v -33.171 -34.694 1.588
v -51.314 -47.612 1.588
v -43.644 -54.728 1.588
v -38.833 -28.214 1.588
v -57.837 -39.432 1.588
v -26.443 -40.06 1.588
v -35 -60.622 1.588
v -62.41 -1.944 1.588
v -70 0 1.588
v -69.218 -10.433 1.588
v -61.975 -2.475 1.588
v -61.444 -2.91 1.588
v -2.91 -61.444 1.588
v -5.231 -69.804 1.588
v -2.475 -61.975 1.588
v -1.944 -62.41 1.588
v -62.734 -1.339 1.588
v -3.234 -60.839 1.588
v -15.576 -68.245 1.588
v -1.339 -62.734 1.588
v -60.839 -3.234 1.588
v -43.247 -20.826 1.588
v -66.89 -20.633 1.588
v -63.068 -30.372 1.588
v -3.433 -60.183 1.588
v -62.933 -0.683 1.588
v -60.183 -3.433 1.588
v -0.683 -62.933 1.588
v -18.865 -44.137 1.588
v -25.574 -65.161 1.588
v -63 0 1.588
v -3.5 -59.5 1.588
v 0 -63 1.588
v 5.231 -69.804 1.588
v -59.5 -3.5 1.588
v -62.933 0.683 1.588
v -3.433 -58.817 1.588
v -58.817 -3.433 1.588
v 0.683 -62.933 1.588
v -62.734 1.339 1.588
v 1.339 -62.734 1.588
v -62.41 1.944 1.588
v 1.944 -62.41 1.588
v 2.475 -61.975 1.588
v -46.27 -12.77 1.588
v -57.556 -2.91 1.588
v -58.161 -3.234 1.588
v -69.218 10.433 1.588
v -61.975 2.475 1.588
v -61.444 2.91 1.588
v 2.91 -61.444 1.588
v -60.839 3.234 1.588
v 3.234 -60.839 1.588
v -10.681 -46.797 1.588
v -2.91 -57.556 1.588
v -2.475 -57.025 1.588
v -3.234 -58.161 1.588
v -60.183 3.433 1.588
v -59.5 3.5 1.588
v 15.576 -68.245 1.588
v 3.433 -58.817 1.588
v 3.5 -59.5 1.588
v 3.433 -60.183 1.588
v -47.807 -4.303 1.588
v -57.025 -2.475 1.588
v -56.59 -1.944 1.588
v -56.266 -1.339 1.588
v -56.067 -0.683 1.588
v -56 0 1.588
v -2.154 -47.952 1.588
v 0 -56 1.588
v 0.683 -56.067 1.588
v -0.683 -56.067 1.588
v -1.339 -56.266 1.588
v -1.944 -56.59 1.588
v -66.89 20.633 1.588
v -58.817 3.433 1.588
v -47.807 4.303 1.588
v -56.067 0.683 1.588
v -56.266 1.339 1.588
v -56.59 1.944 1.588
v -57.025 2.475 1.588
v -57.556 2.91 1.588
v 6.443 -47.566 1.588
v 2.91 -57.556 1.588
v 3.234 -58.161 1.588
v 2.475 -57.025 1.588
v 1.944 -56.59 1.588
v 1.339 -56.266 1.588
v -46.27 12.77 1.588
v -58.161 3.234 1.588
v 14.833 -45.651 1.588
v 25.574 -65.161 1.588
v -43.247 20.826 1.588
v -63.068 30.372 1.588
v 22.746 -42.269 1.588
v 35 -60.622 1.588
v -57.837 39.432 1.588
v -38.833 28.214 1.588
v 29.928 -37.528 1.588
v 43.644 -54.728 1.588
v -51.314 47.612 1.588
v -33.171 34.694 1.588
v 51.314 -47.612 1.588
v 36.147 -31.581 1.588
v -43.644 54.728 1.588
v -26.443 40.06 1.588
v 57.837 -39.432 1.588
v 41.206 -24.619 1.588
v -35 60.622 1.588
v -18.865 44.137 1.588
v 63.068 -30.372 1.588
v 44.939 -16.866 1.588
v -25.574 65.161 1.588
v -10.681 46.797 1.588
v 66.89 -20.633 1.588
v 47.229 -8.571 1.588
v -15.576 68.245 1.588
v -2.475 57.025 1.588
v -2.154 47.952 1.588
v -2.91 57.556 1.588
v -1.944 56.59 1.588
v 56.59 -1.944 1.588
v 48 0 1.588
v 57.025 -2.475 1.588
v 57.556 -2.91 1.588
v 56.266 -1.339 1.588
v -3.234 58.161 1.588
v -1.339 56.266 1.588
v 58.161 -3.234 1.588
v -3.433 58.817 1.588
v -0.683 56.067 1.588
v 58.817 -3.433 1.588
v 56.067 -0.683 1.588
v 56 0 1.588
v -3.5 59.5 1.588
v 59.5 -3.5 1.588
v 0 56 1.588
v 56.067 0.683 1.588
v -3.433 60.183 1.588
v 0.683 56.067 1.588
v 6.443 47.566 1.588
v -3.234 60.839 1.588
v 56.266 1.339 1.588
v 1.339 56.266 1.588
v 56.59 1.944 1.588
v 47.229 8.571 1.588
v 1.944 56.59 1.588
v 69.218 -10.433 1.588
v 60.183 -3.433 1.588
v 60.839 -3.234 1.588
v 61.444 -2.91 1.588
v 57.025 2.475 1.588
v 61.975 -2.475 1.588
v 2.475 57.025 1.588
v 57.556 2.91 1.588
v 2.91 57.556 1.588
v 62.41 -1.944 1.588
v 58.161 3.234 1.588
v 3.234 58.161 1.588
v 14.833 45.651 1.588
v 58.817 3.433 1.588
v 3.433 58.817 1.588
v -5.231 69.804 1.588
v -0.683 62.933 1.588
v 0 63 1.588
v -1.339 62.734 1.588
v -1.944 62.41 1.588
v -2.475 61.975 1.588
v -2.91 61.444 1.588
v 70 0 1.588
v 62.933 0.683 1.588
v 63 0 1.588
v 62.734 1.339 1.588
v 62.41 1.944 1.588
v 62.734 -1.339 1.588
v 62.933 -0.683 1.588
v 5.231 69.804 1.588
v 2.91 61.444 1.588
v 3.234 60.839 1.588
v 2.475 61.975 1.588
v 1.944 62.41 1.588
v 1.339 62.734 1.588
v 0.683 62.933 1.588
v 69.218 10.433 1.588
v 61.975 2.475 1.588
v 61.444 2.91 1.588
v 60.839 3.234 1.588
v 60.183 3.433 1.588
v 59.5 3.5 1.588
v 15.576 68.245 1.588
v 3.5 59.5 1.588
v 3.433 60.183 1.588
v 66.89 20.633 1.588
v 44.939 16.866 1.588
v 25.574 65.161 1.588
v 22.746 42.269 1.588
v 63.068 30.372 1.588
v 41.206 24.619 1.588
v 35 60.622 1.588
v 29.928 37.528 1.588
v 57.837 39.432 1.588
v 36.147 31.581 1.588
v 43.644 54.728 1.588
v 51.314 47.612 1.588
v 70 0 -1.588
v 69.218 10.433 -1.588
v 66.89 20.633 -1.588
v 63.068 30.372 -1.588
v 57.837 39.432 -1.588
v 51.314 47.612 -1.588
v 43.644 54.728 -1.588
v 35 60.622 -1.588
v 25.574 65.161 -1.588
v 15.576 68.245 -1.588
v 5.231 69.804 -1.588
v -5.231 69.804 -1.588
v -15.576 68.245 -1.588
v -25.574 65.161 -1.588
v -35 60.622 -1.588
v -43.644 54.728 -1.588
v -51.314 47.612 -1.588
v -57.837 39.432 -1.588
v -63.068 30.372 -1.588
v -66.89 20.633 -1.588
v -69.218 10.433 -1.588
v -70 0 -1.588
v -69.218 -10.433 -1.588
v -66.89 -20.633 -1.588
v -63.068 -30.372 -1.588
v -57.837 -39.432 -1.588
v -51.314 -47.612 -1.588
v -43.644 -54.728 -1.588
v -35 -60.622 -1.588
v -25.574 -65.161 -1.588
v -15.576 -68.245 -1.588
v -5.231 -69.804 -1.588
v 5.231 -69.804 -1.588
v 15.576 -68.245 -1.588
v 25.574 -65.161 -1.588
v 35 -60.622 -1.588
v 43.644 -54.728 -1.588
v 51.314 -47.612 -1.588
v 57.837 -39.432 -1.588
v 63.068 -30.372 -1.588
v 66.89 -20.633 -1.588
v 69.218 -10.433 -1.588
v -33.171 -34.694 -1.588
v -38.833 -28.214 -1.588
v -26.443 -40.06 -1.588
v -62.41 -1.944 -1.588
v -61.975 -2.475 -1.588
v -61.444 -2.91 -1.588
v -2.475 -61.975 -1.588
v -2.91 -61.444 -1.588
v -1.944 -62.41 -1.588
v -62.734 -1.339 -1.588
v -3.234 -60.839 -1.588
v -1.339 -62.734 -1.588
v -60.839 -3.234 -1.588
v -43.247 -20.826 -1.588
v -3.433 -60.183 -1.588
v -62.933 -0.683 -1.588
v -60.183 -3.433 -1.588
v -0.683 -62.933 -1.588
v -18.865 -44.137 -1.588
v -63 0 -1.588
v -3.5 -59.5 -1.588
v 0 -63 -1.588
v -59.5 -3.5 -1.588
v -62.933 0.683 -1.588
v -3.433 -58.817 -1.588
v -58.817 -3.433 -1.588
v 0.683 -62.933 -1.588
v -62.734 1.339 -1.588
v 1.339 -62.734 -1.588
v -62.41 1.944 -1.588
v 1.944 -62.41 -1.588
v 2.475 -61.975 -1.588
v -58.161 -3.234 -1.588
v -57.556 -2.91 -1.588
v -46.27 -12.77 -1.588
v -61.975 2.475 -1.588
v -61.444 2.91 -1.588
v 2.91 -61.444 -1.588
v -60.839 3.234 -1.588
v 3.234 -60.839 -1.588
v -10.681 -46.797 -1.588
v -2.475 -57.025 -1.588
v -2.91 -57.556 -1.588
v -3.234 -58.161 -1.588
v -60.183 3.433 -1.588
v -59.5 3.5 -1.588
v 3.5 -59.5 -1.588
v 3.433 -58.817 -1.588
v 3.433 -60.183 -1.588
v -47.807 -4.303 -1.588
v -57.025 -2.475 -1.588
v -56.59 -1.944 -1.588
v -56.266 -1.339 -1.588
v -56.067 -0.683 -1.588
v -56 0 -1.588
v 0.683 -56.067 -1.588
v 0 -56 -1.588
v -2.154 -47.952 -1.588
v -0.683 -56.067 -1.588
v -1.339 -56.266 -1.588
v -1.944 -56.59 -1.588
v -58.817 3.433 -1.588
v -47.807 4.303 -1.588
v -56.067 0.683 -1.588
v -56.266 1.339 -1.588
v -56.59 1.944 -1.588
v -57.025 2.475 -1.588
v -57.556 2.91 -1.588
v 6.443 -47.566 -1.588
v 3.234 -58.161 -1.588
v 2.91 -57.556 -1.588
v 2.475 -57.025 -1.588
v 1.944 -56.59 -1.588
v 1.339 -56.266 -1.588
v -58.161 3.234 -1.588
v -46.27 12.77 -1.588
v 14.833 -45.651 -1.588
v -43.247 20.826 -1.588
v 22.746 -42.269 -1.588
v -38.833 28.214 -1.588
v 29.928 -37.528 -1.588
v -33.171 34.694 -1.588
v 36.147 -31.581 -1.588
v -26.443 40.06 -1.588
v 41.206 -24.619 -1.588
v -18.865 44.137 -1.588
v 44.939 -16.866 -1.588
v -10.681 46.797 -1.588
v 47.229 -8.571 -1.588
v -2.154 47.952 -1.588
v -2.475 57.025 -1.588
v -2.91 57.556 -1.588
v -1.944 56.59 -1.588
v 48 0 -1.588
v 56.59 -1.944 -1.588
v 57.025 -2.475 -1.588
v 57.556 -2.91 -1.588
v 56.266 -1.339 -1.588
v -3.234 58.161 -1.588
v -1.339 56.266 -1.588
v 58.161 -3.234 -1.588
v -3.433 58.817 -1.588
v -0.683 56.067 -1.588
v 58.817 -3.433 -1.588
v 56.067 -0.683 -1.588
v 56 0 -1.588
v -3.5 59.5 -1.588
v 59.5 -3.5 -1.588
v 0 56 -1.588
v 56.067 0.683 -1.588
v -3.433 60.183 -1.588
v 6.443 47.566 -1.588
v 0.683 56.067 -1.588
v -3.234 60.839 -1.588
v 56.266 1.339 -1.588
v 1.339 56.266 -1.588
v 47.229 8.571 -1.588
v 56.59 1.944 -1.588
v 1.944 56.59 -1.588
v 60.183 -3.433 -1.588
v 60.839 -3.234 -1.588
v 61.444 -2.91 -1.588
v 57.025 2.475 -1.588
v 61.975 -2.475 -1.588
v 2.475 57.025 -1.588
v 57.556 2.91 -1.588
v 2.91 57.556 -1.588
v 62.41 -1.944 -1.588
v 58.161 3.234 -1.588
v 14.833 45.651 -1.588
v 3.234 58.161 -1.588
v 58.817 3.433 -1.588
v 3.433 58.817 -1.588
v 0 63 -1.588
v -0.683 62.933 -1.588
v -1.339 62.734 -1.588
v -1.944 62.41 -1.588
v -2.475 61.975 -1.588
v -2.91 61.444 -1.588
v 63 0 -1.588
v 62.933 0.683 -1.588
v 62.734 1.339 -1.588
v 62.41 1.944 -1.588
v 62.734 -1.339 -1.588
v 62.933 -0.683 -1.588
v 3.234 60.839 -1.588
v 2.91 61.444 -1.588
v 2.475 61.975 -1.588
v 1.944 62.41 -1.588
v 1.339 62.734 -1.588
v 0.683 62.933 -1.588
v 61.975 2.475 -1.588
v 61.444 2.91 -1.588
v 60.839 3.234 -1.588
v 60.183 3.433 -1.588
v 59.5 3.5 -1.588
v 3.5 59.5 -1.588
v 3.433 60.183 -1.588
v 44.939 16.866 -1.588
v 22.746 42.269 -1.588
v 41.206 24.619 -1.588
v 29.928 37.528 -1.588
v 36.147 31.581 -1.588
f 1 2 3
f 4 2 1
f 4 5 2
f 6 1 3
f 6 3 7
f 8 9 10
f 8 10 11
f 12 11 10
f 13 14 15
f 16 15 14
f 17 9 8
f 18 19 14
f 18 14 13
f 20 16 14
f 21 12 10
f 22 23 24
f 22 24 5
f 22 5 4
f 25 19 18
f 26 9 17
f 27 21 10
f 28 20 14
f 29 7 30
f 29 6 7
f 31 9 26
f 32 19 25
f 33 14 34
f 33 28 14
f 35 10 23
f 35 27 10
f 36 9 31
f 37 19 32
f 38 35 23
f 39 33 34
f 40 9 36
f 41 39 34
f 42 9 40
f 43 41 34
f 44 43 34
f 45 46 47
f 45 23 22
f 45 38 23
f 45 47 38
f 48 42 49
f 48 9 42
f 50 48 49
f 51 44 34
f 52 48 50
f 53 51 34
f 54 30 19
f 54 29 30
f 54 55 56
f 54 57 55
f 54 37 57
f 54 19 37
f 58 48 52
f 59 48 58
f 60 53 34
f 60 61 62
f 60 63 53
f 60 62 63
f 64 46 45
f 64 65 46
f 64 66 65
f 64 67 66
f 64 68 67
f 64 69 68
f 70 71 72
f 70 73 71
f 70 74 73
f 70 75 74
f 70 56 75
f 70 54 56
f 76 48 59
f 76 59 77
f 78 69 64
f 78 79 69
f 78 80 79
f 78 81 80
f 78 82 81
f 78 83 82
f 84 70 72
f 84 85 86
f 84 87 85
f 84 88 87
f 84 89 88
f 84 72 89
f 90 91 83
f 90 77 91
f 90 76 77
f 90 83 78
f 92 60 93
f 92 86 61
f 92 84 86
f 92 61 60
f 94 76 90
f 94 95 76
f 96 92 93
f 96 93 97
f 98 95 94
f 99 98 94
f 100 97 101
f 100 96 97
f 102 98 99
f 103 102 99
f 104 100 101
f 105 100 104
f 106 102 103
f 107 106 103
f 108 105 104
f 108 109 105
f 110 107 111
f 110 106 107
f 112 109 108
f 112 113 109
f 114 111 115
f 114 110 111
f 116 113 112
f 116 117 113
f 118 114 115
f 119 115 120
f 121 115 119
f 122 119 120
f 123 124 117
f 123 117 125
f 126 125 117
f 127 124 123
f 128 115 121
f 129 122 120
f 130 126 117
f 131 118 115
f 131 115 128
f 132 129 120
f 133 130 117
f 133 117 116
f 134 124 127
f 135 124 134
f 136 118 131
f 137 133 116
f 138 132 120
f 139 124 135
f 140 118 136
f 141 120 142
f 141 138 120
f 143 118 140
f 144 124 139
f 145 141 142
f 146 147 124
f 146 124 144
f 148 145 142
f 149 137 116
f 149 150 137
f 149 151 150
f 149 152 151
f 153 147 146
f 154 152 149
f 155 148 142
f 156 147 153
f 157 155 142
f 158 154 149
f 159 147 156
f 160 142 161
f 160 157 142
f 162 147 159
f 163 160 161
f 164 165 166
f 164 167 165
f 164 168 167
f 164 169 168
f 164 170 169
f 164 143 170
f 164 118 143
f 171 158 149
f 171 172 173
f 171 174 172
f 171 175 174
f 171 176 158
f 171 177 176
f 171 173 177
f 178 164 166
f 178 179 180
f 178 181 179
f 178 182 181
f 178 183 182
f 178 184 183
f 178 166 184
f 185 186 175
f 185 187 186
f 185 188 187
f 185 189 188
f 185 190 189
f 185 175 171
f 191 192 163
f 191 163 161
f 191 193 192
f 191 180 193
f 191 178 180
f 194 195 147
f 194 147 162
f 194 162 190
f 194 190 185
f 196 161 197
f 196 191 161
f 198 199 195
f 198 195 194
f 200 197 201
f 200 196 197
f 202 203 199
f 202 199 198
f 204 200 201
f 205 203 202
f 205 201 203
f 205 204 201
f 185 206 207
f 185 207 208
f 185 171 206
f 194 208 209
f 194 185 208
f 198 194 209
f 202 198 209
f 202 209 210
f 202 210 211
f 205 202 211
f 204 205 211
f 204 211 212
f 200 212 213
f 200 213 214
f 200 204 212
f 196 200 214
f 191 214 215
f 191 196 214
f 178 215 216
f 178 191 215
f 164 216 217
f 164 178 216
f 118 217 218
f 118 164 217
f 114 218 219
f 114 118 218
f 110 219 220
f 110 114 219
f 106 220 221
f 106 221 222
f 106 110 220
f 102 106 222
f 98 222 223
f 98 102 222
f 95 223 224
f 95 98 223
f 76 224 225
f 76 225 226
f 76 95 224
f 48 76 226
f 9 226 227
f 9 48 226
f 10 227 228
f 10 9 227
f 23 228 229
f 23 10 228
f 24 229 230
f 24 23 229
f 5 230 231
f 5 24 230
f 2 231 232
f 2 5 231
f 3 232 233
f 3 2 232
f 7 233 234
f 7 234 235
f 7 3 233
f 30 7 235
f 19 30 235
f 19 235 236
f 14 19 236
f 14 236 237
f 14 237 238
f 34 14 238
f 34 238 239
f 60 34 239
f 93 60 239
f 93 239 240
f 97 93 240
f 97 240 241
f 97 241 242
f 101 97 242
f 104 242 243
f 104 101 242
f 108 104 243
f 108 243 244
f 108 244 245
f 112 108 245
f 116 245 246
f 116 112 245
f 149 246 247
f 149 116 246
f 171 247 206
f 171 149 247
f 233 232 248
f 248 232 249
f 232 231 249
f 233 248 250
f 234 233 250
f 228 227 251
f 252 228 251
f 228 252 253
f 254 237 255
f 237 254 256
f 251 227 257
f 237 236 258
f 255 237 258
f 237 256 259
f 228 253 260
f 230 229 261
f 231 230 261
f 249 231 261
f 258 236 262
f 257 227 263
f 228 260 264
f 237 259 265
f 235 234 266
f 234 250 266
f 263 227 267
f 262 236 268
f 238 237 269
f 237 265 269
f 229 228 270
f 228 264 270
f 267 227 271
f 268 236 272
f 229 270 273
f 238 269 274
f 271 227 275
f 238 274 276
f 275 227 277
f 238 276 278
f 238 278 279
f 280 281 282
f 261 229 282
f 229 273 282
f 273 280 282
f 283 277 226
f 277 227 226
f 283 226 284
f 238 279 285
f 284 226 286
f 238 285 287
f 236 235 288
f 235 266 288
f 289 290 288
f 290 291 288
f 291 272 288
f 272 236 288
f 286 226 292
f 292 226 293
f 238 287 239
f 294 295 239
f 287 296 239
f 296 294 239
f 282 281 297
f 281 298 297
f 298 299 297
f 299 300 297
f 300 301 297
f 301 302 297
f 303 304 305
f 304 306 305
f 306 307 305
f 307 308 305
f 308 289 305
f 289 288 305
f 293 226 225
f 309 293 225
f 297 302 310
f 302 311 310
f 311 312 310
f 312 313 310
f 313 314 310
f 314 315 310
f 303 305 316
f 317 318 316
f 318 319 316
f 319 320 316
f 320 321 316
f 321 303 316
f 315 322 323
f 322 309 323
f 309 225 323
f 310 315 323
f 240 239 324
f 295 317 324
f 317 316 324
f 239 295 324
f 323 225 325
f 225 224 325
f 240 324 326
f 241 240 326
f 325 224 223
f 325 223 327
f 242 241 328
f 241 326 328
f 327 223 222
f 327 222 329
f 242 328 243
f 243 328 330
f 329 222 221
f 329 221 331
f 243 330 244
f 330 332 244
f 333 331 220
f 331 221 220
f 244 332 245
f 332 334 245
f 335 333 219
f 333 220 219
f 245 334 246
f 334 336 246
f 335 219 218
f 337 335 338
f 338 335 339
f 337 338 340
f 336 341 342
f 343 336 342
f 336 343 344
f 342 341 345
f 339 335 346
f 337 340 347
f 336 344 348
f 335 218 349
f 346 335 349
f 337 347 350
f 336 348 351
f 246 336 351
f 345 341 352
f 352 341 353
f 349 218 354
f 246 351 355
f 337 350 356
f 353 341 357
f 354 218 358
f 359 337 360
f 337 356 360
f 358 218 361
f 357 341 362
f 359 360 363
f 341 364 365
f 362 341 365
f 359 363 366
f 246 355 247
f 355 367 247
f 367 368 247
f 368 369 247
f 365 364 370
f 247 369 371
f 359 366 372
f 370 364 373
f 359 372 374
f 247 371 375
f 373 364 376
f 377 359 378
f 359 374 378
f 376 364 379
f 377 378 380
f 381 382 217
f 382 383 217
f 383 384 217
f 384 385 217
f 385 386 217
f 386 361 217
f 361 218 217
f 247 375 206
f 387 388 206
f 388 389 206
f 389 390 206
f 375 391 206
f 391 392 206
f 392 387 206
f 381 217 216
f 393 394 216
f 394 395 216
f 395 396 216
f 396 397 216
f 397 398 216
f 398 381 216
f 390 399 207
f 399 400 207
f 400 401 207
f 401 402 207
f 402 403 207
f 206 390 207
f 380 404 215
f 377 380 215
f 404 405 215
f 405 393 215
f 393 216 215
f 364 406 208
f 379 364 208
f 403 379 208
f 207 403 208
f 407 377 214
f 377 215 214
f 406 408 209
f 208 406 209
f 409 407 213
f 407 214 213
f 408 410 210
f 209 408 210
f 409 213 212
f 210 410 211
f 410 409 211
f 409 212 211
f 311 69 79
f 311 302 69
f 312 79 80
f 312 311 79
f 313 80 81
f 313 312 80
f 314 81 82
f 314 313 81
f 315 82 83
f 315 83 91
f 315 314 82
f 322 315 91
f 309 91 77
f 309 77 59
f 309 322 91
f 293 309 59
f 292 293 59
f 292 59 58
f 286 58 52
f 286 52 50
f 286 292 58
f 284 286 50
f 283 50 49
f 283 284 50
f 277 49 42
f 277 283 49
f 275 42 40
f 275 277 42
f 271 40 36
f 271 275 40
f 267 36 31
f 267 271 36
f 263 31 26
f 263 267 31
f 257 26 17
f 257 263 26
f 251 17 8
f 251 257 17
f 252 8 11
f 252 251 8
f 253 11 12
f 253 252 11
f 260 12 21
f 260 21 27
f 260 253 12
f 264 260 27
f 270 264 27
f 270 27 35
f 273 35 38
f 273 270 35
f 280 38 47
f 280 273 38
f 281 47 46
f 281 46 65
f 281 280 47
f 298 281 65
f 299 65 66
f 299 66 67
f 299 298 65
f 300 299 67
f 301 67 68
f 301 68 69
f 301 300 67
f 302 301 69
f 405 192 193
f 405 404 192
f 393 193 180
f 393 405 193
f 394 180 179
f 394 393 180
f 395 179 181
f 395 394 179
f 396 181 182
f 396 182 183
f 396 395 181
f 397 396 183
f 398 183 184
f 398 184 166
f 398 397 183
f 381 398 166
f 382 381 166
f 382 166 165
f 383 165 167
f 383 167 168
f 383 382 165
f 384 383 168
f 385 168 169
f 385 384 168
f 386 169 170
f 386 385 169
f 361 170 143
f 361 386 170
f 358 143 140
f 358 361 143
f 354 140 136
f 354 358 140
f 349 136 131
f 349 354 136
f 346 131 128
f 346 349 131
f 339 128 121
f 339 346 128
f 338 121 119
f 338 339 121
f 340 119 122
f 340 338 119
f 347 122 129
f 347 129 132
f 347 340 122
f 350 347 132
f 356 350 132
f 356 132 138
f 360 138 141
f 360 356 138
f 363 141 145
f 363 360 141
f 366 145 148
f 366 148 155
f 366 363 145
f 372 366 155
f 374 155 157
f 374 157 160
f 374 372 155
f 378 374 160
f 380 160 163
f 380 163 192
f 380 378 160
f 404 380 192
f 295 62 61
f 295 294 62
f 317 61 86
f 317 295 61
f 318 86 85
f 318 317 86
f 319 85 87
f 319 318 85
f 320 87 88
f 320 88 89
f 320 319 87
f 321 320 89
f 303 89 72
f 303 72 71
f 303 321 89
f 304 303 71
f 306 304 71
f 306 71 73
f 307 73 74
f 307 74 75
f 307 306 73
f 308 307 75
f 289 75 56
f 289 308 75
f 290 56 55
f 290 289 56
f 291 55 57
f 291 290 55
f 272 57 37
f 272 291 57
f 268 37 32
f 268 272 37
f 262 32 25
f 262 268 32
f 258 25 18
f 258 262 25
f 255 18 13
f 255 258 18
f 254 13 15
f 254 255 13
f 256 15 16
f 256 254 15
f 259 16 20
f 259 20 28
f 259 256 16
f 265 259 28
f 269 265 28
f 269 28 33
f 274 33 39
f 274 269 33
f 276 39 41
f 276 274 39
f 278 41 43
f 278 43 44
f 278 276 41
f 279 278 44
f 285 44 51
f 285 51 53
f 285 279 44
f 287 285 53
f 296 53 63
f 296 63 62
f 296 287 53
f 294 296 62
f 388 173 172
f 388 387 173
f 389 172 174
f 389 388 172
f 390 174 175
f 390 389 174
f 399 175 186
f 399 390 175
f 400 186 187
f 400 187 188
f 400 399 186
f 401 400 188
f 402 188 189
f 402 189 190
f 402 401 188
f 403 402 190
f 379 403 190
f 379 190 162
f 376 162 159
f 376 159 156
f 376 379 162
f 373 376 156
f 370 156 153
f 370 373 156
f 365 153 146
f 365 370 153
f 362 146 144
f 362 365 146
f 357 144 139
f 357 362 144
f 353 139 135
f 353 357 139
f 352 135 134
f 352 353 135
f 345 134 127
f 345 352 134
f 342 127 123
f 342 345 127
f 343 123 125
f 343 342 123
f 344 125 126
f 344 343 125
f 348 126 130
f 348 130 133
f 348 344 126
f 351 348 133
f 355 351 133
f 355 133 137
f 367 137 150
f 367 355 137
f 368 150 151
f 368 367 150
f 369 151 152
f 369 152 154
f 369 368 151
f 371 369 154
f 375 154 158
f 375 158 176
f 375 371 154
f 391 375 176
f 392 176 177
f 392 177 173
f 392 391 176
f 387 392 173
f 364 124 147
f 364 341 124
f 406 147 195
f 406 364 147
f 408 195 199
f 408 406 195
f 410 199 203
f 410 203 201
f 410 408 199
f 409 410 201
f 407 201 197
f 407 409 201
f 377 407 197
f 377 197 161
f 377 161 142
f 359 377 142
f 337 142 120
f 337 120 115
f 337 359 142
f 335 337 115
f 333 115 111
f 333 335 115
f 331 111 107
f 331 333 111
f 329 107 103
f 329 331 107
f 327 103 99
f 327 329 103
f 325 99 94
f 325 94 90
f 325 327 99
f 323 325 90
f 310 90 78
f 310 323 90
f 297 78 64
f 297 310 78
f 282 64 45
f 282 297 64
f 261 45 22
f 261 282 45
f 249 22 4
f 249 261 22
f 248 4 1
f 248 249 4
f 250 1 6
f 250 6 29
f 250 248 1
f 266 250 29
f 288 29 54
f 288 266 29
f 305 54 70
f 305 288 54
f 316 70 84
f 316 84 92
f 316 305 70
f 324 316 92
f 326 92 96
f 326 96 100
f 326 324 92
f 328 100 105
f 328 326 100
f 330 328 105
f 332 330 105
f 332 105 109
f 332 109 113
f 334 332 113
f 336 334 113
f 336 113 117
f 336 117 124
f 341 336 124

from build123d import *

# Parameters (mm, degrees)
F0_R     = 70
F0_R_2   = 3.5
F0_R_3   = 48
F1_DEPTH = 1.5875


with BuildPart() as f1:
    # F0 (on Top) → F1 (new body, symmetric)
    with BuildSketch(Plane.XY):
        Circle(F0_R)
        with Locations((0, -59.5)):
            Circle(F0_R_2, mode=Mode.SUBTRACT)
        with Locations((-59.5, 0)):
            Circle(F0_R_2, mode=Mode.SUBTRACT)
        Circle(F0_R_3, mode=Mode.SUBTRACT)
        with Locations((59.5, 0)):
            Circle(F0_R_2, mode=Mode.SUBTRACT)
        with Locations((0, 59.5)):
            Circle(F0_R_2, mode=Mode.SUBTRACT)
    extrude(amount=F1_DEPTH, both=True)


solid = f1.part
